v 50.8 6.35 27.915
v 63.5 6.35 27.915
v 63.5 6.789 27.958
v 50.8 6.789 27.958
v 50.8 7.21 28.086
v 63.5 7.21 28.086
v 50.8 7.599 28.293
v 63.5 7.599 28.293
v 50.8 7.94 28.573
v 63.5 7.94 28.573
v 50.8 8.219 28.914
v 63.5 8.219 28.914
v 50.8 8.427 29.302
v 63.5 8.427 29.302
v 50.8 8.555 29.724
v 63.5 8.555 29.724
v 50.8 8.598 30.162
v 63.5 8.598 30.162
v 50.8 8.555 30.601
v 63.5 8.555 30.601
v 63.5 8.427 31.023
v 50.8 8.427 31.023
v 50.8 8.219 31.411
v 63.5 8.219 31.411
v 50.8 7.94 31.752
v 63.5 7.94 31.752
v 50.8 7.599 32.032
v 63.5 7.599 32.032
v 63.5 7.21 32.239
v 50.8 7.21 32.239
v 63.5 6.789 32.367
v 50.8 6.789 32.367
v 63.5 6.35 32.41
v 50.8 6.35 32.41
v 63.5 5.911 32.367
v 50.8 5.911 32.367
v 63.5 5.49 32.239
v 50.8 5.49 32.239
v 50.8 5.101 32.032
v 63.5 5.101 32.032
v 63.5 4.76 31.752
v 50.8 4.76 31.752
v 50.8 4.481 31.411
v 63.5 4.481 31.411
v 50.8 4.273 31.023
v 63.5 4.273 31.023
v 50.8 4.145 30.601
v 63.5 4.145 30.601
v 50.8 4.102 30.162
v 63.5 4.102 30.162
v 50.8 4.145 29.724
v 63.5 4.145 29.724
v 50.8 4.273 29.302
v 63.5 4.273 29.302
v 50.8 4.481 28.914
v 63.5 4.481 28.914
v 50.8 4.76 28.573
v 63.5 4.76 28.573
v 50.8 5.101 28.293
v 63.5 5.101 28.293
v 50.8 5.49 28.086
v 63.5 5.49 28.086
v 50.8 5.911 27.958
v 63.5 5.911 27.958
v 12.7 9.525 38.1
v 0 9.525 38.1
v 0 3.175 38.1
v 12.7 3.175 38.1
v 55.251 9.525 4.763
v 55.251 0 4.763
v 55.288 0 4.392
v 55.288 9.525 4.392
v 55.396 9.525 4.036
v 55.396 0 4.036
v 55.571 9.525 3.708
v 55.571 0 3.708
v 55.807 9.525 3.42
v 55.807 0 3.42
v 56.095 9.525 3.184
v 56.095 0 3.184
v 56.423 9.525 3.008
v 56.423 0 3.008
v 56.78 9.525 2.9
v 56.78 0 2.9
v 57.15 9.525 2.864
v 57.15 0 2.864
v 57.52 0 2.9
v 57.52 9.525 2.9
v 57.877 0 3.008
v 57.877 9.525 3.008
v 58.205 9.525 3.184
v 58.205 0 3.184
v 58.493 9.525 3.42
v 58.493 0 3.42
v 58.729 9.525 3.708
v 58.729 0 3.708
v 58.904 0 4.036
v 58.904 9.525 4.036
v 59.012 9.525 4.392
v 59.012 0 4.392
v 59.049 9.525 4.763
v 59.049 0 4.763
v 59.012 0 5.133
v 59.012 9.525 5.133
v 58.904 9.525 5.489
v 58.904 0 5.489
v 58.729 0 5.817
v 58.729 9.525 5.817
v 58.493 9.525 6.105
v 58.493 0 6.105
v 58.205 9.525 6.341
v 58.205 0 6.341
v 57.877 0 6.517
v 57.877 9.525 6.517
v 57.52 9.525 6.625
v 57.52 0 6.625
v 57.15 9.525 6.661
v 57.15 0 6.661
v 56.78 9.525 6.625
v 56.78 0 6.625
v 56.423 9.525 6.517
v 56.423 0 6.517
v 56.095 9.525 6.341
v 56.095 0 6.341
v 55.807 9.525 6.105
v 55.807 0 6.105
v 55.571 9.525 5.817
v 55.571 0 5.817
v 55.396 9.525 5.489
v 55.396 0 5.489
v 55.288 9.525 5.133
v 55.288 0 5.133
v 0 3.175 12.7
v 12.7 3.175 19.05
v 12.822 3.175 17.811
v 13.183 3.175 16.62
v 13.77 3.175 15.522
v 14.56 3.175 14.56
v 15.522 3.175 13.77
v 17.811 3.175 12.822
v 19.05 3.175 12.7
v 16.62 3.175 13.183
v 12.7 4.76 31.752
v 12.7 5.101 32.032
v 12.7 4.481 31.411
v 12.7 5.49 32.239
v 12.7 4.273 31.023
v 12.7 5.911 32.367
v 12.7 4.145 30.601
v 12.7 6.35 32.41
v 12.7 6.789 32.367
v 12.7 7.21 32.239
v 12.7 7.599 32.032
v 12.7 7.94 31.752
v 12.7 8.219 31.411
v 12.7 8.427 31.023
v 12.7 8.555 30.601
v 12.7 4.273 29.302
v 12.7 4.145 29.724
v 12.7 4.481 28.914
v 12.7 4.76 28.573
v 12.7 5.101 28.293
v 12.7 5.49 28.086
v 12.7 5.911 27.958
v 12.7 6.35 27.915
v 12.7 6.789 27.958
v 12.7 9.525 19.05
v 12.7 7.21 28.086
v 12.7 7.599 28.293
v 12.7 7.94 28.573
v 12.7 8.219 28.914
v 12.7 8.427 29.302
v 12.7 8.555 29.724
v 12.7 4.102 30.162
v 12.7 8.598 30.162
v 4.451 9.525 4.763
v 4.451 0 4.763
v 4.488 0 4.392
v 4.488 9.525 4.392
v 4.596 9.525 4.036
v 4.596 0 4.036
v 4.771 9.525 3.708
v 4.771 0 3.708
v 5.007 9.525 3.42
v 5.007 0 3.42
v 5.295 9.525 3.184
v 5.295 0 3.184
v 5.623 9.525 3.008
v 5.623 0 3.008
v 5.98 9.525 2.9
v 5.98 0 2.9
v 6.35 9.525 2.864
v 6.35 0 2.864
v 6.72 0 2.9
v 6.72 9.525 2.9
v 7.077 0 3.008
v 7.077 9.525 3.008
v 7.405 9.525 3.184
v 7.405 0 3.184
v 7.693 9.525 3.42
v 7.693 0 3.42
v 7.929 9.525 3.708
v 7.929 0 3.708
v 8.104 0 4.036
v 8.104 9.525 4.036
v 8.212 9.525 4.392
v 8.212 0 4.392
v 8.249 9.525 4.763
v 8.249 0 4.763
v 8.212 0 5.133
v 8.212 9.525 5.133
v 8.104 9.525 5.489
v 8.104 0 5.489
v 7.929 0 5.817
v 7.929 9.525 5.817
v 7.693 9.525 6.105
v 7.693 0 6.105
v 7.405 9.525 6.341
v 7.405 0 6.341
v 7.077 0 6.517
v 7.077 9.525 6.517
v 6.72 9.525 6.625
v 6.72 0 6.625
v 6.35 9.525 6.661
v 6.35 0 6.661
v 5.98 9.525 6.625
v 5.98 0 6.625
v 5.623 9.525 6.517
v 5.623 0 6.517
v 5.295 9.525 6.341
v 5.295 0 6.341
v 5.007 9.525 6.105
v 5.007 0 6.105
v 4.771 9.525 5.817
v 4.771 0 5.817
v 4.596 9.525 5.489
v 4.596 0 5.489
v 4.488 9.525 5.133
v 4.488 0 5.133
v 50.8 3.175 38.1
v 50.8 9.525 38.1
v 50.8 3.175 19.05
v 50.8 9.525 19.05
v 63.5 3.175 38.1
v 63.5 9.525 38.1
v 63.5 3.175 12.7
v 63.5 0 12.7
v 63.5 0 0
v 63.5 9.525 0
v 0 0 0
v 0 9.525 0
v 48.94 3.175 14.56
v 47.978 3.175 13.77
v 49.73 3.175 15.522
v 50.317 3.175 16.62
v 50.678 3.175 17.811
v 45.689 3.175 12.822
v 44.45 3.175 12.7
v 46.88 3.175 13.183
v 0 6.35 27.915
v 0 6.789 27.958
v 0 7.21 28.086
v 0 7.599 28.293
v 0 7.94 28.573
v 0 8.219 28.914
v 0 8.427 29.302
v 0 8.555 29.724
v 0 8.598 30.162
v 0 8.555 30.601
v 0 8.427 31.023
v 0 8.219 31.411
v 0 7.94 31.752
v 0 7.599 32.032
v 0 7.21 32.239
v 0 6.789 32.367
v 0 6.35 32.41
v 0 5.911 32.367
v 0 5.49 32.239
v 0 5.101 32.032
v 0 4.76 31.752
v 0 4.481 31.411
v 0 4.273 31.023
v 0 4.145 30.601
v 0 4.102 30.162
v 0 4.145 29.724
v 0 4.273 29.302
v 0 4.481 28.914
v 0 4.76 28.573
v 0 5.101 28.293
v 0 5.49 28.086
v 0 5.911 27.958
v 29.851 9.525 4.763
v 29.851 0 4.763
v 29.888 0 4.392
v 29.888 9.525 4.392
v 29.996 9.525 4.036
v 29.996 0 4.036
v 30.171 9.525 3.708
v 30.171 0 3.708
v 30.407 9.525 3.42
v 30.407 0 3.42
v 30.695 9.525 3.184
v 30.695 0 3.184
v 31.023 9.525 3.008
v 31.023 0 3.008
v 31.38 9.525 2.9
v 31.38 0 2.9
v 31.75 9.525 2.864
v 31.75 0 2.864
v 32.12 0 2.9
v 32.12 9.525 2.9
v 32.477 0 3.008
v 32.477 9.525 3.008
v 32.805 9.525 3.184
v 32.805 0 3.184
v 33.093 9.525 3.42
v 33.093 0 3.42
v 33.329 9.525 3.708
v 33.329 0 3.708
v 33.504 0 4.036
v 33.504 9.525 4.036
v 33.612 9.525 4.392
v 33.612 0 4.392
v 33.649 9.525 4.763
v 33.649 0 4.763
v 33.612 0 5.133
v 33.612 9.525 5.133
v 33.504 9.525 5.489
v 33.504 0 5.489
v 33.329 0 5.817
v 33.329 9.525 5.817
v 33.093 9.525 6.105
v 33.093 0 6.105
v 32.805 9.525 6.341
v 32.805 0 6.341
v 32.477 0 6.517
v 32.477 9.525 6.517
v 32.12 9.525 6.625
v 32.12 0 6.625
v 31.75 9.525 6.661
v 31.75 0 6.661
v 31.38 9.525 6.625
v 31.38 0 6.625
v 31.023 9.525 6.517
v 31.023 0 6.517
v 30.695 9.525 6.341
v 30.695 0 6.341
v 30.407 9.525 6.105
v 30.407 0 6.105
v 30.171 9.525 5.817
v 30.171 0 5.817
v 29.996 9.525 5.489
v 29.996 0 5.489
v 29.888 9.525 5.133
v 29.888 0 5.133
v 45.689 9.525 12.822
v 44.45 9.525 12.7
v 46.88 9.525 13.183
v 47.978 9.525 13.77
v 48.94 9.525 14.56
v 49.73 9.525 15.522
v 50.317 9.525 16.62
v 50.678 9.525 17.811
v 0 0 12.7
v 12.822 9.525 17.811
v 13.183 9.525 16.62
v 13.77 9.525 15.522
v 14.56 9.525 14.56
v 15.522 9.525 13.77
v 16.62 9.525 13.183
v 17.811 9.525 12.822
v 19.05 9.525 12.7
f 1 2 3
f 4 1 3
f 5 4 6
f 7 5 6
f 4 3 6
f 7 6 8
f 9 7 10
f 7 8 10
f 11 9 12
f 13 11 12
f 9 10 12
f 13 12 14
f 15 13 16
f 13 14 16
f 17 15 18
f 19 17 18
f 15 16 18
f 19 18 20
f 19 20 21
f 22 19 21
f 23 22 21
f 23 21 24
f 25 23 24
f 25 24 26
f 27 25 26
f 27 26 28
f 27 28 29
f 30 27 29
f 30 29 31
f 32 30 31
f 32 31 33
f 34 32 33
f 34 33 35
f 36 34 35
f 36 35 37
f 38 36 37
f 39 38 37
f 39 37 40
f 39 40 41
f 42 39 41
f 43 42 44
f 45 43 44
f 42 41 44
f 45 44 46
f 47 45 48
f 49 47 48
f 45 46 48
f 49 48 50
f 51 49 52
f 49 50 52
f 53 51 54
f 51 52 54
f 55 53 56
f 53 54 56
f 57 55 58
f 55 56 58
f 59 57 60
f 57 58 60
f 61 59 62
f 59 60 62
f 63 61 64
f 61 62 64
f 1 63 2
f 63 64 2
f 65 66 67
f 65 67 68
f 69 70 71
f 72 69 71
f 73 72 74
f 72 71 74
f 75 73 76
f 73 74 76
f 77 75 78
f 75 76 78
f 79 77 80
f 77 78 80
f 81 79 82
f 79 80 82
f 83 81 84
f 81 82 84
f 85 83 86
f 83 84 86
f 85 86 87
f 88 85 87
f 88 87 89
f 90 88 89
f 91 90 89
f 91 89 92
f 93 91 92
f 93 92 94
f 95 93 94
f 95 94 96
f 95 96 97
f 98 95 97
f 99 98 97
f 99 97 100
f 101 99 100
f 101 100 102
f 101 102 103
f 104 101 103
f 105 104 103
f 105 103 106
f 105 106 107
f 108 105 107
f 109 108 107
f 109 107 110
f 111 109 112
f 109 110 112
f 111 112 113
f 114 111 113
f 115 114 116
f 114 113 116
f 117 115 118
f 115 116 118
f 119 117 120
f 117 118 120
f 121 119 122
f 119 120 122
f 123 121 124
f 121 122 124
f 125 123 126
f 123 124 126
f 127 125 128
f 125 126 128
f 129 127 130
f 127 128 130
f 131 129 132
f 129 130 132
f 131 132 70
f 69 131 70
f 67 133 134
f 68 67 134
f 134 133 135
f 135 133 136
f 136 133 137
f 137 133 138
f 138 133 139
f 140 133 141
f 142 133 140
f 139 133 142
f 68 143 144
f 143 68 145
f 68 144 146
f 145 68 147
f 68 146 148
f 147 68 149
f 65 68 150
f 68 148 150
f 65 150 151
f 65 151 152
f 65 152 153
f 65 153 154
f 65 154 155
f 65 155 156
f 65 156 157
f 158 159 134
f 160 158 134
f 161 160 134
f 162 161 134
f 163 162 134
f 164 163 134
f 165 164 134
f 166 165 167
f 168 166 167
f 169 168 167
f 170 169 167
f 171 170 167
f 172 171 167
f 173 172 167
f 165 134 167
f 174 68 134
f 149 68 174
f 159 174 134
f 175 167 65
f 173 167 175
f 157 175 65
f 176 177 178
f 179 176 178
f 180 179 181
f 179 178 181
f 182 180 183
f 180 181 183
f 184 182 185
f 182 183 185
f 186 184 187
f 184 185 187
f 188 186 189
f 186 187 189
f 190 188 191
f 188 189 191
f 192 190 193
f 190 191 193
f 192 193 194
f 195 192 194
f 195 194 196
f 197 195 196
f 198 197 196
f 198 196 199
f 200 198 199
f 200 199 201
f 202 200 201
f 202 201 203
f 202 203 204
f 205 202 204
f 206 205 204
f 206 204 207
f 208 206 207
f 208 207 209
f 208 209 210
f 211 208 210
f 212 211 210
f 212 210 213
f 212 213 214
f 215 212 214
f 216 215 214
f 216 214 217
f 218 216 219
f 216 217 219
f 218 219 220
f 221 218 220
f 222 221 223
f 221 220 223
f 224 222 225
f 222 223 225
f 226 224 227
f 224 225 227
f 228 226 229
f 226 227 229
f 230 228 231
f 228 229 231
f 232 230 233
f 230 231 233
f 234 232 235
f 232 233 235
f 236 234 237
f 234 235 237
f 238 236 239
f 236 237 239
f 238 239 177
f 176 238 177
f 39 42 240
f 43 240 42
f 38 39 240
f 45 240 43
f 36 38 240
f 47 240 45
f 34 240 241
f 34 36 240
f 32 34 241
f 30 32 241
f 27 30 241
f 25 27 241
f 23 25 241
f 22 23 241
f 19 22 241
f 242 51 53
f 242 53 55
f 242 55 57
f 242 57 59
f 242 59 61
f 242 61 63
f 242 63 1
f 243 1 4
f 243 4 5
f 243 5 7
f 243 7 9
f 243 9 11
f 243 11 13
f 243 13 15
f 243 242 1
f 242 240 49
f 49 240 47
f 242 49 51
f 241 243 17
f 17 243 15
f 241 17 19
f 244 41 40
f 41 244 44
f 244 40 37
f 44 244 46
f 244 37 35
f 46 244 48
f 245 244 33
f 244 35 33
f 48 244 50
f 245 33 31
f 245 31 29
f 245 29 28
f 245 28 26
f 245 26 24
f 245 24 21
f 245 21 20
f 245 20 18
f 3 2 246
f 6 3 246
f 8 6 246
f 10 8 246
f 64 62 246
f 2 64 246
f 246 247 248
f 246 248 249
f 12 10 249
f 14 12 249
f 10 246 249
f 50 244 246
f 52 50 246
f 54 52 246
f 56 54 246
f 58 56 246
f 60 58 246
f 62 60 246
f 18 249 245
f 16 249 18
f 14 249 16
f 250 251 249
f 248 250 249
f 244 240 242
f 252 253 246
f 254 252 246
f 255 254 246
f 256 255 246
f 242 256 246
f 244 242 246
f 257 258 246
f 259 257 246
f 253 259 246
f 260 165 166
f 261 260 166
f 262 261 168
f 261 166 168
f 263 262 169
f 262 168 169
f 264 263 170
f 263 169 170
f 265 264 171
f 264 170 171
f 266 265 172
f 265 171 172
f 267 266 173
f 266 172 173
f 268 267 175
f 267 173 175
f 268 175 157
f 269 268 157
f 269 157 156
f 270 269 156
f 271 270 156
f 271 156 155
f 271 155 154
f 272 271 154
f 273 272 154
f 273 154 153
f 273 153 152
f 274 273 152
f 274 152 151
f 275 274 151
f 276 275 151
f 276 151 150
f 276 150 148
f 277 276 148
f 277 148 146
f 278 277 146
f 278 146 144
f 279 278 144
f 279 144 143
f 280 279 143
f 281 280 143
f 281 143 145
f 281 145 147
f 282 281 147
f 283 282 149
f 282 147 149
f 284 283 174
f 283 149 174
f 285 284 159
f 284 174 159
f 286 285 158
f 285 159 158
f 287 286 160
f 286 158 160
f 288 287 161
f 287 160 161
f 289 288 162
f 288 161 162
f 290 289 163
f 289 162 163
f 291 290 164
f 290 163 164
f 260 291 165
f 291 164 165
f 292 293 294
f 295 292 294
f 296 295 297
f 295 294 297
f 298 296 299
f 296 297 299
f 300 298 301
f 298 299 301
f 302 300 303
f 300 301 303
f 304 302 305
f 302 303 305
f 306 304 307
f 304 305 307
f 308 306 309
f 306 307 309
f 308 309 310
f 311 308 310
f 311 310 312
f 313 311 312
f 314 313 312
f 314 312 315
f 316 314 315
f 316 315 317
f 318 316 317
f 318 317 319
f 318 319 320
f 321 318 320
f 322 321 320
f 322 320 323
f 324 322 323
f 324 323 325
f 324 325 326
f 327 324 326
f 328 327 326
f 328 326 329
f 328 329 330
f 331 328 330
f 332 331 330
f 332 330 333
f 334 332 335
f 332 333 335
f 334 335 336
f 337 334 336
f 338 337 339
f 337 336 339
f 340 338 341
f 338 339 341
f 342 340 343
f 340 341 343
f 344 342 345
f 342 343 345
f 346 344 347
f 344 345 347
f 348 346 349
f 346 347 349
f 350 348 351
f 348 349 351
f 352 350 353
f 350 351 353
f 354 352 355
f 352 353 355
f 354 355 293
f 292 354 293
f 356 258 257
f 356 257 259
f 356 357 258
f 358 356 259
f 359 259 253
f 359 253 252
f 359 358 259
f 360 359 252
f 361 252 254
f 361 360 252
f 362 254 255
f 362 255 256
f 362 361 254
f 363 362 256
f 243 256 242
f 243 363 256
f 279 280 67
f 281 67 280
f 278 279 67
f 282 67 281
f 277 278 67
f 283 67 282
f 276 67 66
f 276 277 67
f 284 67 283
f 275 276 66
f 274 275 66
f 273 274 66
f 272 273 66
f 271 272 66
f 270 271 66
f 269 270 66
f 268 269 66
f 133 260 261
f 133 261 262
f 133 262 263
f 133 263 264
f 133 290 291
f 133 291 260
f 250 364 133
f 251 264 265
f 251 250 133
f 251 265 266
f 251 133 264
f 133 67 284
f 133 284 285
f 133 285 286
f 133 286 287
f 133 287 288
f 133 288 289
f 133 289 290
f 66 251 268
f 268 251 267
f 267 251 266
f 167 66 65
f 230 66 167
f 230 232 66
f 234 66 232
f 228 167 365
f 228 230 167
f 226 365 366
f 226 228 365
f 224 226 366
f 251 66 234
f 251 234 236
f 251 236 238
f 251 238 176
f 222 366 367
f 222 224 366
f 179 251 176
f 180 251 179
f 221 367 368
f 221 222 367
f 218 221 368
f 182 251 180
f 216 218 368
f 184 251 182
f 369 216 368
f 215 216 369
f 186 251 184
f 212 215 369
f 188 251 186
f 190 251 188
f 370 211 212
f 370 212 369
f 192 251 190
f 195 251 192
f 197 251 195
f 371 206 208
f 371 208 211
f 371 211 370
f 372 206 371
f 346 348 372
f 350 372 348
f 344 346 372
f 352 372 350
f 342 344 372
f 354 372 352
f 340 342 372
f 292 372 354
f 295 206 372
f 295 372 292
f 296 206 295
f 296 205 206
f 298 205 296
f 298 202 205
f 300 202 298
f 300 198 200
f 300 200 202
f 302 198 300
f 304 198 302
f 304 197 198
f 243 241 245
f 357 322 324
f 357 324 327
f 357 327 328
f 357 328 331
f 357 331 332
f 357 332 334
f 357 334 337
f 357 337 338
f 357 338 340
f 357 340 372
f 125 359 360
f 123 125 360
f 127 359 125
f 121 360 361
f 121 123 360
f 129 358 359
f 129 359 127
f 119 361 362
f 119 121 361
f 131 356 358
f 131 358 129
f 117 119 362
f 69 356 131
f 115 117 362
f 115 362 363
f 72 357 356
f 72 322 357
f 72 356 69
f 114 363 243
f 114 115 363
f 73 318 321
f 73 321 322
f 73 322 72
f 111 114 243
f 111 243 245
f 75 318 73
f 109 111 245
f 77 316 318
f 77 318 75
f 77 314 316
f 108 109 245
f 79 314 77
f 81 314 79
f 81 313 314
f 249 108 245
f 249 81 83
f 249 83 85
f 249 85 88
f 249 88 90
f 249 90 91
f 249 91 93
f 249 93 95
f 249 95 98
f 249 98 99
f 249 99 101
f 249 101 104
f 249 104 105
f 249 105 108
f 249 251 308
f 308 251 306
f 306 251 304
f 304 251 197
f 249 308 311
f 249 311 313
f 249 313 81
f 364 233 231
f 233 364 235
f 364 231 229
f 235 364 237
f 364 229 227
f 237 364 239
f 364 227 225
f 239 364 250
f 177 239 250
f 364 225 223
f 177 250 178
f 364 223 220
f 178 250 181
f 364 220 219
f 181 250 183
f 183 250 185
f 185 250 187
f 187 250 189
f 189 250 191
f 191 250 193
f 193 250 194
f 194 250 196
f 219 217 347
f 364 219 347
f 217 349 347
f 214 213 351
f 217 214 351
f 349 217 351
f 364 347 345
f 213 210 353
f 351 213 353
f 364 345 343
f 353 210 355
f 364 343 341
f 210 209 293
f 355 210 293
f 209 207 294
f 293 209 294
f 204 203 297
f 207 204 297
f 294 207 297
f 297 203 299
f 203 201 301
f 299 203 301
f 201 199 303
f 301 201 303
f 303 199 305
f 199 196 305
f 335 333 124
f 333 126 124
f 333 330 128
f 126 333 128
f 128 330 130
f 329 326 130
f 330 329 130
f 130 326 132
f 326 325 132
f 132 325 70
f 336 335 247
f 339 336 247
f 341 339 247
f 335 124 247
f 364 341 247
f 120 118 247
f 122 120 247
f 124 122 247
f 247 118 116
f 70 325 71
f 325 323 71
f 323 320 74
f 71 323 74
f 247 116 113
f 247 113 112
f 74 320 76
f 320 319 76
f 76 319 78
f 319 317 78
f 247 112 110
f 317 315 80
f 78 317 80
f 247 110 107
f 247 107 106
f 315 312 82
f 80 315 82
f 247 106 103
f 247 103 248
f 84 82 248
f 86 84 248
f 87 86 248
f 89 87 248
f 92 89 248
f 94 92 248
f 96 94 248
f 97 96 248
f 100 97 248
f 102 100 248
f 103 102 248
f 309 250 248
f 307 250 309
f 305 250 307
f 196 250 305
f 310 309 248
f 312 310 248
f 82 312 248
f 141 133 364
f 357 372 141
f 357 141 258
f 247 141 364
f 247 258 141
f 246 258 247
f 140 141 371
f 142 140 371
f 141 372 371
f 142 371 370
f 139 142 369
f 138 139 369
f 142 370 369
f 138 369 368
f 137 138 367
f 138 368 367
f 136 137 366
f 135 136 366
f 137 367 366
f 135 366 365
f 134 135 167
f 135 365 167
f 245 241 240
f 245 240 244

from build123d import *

# Parameters (mm, degrees)
SKETCH3_W                  = 63.5
SKETCH3_H                  = 9.525
BOSS_EXTRUDE1_DEPTH        = 12.7
TAP_DRILL_FOR_10_24_TAP1_D = 3.7973
SKETCH11_W                 = 12.7
SKETCH11_H                 = 6.35
BOSS_EXTRUDE2_DEPTH        = 25.4
F_8_CLEARANCE_HOLE2_D      = 4.4958
FILLET1_R                  = 6.35


with BuildPart() as part:
    # Sketch3 → Boss-Extrude1 (new body)
    with BuildSketch(Plane.XY):
        with Locations((31.75, 4.7625)):
            Rectangle(SKETCH3_W, SKETCH3_H)
    extrude(amount=BOSS_EXTRUDE1_DEPTH)

    # Tap Drill for #10-24 Tap1 (through all)
    with Locations(Plane(origin=(0, 9.525, 0), x_dir=(1, 0, 0), z_dir=(0, 1, 0))):
        with Locations((57.15, -4.7625), (6.35, -4.7625), (31.75, -4.7625)):
            Hole(TAP_DRILL_FOR_10_24_TAP1_D / 2)

    # Sketch11 → Boss-Extrude2 (add)
    with BuildSketch(Plane.XY.offset(12.7)):
        with Locations((6.35, 6.35)):
            Rectangle(SKETCH11_W, SKETCH11_H)
        with Locations((57.15, 6.35)):
            Rectangle(SKETCH11_W, SKETCH11_H)
    extrude(amount=BOSS_EXTRUDE2_DEPTH)

    # #8 Clearance Hole2 (through all)
    with Locations(Plane.ZY):
        with Locations((30.1625, 6.35)):
            Hole(F_8_CLEARANCE_HOLE2_D / 2)

    # Fillet1
    fillet1_edges = [part.edges().sort_by_distance(p)[0] for p in [
        (12.7, 6.35, 12.7),
        (50.8, 6.35, 12.7),
    ]]
    fillet(fillet1_edges, radius=FILLET1_R)


solid = part.part
